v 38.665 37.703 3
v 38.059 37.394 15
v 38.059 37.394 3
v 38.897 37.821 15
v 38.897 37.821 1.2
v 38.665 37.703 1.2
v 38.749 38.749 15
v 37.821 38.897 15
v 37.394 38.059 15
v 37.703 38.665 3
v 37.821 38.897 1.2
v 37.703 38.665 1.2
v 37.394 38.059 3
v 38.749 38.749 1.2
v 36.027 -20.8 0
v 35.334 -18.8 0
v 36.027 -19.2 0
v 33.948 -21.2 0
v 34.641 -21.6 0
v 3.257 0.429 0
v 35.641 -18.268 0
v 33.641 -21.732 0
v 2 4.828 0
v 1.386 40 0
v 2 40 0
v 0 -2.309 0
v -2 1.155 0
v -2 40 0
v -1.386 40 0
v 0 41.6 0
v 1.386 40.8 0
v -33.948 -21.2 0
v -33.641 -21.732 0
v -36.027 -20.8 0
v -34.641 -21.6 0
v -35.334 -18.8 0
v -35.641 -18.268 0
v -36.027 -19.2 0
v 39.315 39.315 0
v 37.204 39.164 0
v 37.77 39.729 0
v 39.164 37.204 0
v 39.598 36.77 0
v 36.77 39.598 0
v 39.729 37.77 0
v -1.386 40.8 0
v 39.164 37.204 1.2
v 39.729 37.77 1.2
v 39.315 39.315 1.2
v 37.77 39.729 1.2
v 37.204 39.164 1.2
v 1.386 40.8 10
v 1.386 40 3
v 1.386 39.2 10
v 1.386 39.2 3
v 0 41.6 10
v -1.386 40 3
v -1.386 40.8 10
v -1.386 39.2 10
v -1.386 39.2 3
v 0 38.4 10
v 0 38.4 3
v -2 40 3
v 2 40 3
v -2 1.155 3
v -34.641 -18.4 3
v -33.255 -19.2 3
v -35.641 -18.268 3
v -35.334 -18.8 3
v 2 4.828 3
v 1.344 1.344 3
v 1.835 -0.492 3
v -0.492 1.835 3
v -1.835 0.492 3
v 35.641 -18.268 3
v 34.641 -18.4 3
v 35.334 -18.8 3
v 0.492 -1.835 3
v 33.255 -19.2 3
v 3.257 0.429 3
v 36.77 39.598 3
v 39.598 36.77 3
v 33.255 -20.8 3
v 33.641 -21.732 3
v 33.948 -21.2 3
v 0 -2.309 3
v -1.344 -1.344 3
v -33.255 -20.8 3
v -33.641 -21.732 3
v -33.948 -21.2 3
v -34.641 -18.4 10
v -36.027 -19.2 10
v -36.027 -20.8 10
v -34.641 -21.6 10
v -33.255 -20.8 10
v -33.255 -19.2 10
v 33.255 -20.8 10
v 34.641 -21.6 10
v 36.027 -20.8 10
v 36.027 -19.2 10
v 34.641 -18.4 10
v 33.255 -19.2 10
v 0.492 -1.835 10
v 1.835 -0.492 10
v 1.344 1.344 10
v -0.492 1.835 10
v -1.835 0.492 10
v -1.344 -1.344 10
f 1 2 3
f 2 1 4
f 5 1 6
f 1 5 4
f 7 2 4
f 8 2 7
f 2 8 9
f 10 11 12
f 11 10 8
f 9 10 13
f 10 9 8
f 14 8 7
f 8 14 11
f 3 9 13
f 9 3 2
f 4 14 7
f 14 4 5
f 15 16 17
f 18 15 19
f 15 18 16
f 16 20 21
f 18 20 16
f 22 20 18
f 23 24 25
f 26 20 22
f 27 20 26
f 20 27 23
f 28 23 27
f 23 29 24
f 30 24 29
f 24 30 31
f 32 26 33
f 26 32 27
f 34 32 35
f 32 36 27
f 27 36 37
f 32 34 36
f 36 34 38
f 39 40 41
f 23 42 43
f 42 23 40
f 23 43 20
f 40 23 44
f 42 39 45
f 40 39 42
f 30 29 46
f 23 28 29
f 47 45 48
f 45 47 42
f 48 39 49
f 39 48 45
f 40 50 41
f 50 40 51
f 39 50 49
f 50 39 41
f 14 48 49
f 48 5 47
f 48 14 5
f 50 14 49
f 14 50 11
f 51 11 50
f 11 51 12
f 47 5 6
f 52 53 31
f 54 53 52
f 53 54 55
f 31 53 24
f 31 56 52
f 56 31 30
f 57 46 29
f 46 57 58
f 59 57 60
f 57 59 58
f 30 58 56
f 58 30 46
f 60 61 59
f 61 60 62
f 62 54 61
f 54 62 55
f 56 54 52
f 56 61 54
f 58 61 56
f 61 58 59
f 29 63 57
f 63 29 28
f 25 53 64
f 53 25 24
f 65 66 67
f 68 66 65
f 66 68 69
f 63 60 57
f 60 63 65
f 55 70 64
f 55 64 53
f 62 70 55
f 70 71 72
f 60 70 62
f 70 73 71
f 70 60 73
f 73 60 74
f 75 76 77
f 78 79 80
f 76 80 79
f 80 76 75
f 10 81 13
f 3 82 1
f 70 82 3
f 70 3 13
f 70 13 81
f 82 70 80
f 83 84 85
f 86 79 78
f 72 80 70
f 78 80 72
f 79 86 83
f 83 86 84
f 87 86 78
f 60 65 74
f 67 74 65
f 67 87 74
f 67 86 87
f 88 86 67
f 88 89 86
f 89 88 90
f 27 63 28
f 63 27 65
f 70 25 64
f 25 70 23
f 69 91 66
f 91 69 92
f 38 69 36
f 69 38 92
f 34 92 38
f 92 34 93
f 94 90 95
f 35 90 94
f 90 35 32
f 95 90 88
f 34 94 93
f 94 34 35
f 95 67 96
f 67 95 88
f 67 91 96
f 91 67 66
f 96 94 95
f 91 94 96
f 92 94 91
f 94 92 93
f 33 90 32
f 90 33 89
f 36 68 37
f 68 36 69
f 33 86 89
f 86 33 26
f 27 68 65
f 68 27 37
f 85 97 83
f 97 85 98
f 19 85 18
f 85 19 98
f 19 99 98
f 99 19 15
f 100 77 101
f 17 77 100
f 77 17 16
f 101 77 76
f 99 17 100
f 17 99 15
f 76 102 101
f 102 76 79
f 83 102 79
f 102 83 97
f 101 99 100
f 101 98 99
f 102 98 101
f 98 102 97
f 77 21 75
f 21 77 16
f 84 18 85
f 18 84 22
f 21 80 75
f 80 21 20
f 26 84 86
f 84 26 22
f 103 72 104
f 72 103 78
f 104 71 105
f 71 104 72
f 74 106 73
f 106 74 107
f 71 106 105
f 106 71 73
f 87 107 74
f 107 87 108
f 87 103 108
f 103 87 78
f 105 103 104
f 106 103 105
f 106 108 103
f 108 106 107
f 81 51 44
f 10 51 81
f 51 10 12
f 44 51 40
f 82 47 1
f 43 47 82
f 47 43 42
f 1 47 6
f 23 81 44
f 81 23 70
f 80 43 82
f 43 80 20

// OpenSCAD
//Made by Timmytool


//variables
//diamiter of the centre hole, in mm
centreD=3.8;
//total hight of the centre spire 
centreH=10;
//steam vent diamiter
steamventD=1.6;
//distance between the centre hole and the steam vent hole (centre to centre), in mm
steamventT=54;
//steam vent hight, make higher then the centre hight, if to take you can clip it with plyers/standley knife 
steamventH=15;
//keeping this the same as the centre hight seems to work well
bowlsupportH=10;
//the larger this is the more stable the "pan",take in to consideration 3d printer platform space.
bowlsupportT=40;


layerhight=0.2+1-1;

//calculations
centreR=centreD/2;
steamventR=steamventD/2;
steamventE=steamventR*2;
mikiears=layerhight*6;

rotate([0,0,45]){

cylinder(centreH,centreR,centreR);	//centre

translate([steamventT,0,0]){			//steam vent
	cylinder(steamventH,steamventR,steamventR);
	cylinder(mikiears,steamventE,steamventE);}
	translate([0,-2,0])cube([54,4,3]);

rotate([0,0,45]){						//bowl support1
	translate([bowlsupportT,0,0]){
		cylinder(bowlsupportH,steamventD,steamventD);
		cylinder(mikiears,steamventD,steamventE);}
	translate([0,-2,0])cube([bowlsupportT,4,3]);}

rotate([0,0,165]){					//bowl support2
	translate([bowlsupportT,0,0]){
		cylinder(bowlsupportH,steamventD,steamventD);
		cylinder(mikiears,steamventD,steamventE);}
	translate([0,-2,0])cube([bowlsupportT,4,3]);}

rotate([0,0,285]){					//bowl support3
	translate([bowlsupportT,0,0]){
		cylinder(bowlsupportH,steamventD,steamventD);
		cylinder(mikiears,steamventD,steamventE);}
	translate([0,-2,0])cube([bowlsupportT,4,3]);}
}
